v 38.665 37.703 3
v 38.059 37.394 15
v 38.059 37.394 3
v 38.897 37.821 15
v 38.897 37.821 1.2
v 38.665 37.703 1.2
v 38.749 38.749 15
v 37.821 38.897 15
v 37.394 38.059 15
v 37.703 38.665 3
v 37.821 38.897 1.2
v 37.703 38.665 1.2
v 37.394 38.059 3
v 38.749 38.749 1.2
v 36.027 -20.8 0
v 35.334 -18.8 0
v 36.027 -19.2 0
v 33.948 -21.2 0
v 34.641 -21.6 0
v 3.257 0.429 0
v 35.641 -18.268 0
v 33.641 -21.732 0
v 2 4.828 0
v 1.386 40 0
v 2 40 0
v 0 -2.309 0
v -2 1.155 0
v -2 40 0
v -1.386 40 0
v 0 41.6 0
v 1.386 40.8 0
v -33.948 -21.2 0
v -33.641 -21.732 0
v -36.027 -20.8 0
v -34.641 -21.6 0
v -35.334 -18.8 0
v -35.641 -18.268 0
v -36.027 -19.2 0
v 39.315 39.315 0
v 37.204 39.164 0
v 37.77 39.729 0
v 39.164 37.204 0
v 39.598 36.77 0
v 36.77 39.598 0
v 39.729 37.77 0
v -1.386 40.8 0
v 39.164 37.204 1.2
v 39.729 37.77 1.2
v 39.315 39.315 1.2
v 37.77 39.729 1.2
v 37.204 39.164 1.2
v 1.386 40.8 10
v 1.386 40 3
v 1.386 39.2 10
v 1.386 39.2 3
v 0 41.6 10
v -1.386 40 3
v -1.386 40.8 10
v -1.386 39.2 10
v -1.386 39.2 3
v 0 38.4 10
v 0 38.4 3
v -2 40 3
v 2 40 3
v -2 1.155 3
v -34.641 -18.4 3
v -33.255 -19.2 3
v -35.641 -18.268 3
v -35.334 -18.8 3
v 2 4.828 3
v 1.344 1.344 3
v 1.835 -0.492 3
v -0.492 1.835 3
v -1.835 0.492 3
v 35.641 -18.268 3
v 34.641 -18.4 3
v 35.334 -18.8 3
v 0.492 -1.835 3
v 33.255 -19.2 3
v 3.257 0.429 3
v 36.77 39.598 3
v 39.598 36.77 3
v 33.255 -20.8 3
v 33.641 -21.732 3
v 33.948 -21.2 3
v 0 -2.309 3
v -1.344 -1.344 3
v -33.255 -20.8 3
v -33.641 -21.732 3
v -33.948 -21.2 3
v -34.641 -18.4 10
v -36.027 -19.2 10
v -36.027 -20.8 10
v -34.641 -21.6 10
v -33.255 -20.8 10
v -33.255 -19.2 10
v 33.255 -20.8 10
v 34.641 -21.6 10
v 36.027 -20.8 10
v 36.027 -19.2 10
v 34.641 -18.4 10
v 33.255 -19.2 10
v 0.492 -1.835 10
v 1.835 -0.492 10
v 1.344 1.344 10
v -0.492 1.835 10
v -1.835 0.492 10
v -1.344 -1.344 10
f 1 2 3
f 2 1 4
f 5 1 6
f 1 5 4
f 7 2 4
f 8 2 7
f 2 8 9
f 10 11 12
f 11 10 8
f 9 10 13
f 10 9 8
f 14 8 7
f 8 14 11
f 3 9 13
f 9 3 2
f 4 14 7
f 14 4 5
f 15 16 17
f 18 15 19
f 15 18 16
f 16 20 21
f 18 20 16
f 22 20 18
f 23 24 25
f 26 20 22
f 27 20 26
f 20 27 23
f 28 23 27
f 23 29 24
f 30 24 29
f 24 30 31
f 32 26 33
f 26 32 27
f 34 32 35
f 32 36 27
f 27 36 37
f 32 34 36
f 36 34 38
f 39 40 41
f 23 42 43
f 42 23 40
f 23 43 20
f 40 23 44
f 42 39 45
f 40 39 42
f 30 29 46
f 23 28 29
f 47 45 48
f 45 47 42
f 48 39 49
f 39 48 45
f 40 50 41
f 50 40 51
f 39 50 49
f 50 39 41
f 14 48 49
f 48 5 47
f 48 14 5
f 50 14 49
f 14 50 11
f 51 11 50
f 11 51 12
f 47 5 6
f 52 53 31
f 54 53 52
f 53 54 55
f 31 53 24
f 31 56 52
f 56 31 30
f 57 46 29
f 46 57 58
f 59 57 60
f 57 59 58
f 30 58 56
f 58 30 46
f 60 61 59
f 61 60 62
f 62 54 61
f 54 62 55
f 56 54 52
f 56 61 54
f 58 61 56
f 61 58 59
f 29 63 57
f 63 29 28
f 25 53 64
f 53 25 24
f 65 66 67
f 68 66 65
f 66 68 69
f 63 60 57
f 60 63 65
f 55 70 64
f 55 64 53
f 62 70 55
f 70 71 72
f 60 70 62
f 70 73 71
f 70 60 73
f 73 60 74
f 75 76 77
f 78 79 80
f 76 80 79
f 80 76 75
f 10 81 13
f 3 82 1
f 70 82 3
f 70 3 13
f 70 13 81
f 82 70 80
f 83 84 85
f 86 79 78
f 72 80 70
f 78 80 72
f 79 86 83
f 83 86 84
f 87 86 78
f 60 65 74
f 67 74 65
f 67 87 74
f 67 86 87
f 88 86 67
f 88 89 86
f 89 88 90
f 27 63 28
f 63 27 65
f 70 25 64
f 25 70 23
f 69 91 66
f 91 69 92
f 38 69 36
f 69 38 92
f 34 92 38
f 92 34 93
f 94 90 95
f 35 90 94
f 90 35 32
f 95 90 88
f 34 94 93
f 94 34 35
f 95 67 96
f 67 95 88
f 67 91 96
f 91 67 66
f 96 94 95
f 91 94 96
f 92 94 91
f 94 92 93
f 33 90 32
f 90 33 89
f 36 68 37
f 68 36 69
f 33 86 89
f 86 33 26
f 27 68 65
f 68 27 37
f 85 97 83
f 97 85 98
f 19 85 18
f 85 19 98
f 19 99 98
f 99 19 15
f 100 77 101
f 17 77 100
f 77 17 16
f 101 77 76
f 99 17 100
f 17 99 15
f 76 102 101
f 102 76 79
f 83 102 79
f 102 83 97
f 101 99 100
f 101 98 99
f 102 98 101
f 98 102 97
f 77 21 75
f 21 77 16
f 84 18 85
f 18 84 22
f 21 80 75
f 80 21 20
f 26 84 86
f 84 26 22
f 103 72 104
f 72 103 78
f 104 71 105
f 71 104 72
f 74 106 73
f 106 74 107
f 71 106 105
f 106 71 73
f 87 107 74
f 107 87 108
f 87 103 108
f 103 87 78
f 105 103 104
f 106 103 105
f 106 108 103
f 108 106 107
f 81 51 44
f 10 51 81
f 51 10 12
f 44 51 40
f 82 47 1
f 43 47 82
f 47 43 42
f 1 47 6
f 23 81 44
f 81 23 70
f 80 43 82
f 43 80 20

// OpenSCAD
//Made by Timmytool


//variables
//diamiter of the centre hole, in mm
centreD=3.8;
//total hight of the centre spire 
centreH=10;
//steam vent diamiter
steamventD=1.6;
//distance between the centre hole and the steam vent hole (centre to centre), in mm
steamventT=54;
//steam vent hight, make higher then the centre hight, if to take you can clip it with plyers/standley knife 
steamventH=15;
//keeping this the same as the centre hight seems to work well
bowlsupportH=10;
//the larger this is the more stable the "pan",take in to consideration 3d printer platform space.
bowlsupportT=40;


layerhight=0.2+1-1;

//calculations
centreR=centreD/2;
steamventR=steamventD/2;
steamventE=steamventR*2;
mikiears=layerhight*6;

rotate([0,0,45]){

cylinder(centreH,centreR,centreR);	//centre

translate([steamventT,0,0]){			//steam vent
	cylinder(steamventH,steamventR,steamventR);
	cylinder(mikiears,steamventE,steamventE);}
	translate([0,-2,0])cube([54,4,3]);

rotate([0,0,45]){						//bowl support1
	translate([bowlsupportT,0,0]){
		cylinder(bowlsupportH,steamventD,steamventD);
		cylinder(mikiears,steamventD,steamventE);}
	translate([0,-2,0])cube([bowlsupportT,4,3]);}

rotate([0,0,165]){					//bowl support2
	translate([bowlsupportT,0,0]){
		cylinder(bowlsupportH,steamventD,steamventD);
		cylinder(mikiears,steamventD,steamventE);}
	translate([0,-2,0])cube([bowlsupportT,4,3]);}

rotate([0,0,285]){					//bowl support3
	translate([bowlsupportT,0,0]){
		cylinder(bowlsupportH,steamventD,steamventD);
		cylinder(mikiears,steamventD,steamventE);}
	translate([0,-2,0])cube([bowlsupportT,4,3]);}
}
